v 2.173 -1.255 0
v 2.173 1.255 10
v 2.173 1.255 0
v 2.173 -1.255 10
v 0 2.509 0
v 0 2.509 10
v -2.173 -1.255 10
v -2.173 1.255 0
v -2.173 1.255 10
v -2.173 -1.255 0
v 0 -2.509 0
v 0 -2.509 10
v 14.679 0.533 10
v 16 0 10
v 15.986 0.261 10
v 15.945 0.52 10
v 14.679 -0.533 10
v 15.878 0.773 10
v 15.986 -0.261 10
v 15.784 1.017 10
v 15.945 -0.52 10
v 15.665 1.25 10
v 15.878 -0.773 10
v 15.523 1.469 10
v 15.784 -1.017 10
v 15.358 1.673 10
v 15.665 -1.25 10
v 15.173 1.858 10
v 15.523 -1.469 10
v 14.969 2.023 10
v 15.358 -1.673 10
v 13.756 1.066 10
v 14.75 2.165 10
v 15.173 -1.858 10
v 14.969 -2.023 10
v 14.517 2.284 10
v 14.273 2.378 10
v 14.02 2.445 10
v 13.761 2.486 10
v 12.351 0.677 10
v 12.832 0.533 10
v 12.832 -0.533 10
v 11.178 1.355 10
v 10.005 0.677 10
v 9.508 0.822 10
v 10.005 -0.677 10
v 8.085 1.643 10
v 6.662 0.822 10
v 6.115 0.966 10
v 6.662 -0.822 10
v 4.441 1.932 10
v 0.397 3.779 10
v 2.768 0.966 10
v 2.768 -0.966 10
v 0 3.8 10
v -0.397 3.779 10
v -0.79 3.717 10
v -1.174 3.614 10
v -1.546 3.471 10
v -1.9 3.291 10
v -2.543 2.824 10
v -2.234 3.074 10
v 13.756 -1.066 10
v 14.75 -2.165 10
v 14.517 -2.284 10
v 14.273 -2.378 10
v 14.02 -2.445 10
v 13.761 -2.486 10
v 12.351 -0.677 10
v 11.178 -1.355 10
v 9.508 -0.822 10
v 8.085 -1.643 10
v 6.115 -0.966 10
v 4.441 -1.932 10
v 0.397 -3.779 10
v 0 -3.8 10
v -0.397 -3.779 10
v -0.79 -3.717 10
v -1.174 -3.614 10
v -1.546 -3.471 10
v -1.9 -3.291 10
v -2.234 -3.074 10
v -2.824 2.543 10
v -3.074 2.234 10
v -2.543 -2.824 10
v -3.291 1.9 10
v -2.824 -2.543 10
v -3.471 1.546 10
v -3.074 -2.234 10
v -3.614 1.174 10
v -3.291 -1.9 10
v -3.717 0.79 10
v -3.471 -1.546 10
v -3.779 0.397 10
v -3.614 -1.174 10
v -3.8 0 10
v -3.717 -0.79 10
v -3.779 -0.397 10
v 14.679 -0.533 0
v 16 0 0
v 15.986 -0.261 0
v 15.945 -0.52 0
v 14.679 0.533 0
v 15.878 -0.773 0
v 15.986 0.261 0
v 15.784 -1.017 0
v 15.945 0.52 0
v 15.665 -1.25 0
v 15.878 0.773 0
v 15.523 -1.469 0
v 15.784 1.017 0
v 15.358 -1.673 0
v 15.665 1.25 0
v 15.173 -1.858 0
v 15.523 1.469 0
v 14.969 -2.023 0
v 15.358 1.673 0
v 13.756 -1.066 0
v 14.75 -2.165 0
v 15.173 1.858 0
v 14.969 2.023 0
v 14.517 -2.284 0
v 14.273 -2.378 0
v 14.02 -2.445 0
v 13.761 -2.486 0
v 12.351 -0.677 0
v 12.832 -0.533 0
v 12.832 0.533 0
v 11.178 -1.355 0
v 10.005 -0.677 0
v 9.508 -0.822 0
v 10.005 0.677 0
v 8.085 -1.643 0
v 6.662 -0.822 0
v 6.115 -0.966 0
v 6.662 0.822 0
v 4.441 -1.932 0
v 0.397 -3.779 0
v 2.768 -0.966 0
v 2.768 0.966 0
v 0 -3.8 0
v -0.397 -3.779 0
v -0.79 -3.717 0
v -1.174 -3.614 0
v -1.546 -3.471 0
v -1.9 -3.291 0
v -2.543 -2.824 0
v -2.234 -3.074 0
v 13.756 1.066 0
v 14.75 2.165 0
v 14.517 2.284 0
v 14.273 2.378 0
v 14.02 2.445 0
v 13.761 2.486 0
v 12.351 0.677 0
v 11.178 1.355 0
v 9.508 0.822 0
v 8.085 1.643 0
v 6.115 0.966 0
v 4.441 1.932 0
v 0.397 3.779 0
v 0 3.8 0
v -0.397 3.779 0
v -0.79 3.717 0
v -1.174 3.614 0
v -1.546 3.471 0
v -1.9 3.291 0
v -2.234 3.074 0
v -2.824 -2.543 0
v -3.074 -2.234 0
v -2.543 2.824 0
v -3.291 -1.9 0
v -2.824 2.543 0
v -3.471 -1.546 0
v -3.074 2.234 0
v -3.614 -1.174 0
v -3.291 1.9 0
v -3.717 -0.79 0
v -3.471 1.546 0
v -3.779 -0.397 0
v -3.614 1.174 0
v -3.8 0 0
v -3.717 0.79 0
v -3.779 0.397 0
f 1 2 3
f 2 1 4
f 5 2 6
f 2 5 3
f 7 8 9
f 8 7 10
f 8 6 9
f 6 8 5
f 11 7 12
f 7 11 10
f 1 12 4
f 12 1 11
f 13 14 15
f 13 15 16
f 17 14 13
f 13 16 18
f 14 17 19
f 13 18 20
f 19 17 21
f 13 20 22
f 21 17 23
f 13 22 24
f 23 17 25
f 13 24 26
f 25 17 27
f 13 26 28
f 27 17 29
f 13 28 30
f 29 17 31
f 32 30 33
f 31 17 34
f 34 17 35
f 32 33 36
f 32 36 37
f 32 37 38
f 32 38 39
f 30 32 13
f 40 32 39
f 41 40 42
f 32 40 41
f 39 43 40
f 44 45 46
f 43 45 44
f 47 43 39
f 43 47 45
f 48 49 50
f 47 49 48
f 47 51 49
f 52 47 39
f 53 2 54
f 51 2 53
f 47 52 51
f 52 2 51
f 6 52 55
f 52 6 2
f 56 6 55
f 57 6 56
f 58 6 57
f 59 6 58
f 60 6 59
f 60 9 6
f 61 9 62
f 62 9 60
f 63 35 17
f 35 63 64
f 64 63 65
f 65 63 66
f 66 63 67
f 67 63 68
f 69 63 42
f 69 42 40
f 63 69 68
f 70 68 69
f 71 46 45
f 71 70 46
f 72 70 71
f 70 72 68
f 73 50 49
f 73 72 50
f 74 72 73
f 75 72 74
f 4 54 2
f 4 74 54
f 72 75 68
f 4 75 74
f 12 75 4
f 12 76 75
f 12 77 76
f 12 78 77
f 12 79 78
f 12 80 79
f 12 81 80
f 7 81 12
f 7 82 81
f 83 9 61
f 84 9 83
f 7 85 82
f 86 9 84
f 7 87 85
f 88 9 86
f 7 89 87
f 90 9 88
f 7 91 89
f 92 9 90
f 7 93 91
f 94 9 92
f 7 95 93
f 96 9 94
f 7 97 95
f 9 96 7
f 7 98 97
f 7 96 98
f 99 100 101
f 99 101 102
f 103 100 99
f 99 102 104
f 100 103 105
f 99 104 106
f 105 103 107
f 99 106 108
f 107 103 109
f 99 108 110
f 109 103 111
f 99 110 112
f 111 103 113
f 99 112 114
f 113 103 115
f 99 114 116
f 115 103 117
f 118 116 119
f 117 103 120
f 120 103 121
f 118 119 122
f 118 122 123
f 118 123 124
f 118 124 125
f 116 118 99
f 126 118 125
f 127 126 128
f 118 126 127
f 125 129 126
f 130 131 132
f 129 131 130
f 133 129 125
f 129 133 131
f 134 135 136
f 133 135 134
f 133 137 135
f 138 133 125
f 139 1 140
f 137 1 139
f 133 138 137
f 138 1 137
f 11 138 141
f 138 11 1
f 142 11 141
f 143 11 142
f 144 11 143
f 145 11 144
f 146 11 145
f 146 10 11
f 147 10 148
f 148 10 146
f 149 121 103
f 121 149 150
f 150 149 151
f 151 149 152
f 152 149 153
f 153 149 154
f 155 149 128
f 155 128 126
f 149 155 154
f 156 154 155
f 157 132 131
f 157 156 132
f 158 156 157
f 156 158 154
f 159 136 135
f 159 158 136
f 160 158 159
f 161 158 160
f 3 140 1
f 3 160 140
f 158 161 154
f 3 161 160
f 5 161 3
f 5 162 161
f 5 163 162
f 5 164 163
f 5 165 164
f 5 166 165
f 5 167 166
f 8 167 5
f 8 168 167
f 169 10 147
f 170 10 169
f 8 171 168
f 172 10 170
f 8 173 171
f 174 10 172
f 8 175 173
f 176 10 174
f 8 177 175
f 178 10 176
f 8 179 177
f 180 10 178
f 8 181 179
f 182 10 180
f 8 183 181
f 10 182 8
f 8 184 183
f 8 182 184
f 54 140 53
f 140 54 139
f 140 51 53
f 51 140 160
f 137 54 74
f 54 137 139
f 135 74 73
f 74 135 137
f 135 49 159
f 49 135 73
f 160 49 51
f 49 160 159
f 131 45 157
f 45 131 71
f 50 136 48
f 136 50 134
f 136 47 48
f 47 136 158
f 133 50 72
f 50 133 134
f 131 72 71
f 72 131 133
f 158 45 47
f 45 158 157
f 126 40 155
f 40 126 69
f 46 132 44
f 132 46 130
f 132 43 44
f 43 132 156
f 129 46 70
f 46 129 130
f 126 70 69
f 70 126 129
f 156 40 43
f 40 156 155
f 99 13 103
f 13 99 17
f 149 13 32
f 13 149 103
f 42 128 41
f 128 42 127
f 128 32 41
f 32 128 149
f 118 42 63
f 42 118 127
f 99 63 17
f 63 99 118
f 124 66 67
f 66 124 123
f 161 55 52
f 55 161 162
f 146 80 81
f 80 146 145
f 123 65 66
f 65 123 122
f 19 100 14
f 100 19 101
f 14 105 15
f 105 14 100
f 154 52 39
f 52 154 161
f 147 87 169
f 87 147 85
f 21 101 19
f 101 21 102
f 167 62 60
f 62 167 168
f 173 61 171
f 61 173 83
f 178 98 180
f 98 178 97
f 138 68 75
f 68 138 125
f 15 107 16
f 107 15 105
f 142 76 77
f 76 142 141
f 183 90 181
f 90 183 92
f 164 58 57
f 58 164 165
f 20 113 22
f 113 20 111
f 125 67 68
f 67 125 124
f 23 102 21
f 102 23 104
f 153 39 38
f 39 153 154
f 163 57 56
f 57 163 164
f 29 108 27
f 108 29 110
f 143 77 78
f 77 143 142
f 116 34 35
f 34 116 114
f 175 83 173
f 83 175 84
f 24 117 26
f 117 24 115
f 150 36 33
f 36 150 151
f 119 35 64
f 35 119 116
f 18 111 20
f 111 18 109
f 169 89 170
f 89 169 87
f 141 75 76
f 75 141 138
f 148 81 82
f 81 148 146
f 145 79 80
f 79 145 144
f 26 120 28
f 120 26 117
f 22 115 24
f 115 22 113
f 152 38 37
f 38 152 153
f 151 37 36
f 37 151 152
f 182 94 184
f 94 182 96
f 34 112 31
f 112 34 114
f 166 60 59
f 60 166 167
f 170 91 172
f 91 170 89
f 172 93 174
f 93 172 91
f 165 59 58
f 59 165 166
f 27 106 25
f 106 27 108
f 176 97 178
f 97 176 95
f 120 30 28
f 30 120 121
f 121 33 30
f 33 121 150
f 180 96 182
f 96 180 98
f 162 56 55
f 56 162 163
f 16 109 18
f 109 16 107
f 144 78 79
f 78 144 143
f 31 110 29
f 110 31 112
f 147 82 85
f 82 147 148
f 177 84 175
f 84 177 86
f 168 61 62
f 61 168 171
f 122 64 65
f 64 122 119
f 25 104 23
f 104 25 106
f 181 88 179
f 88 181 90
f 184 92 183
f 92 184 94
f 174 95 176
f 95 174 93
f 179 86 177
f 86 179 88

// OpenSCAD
// Creality Ender 3 Pro comes with 5 Alan Keys 4, 3, 2.5, 2, 1.5 mm
// Radius is calculated by using the Pythagoras Theorem

ak40r=(0.5*4.0)/sin(60);   // Radius of Alan Key 4.0 mm
ak30r=(0.5*3.0)/sin(60);   // Radius of Alan Key 3.0 mm
ak25r=(0.5*2.5)/sin(60);   // Radius of Alan Key 2.5 mm
ak20r=(0.5*2.0)/sin(60);   // Radius of Alan Key 2.0 mm
ak15r=(0.5*1.5)/sin(60);   // Radius of Alan Key 1.5 mm

t=0.2;
h=10;

ak40x=0;
ak30x=ak40r+t+ak30r+t;
ak25x=ak40r+t+ak30r+t+ak25r+t+2.0;
ak20x=ak40r+t+ak30r+t+ak25r+t+ak25r+t+3.45;
ak15x=ak40r+t+ak30r+t+ak25r+t+ak20r+t+ak15r+t+5.25;



difference(){
    hull(){
        translate([0,0,0]) rotate(90) cylinder(r=3.8,h=h,$fn=60);
        translate([13.5,0,0]) rotate(90) cylinder(r=2.5,h=h,$fn=60);
    }
    union(){
        translate([ak40x,0,0]) rotate(90) cylinder(r=ak40r+t,h=h,$fn=6);
        translate([ak30x,0,0]) rotate(90) cylinder(r=ak30r+t,h=h,$fn=6);
        translate([ak25x,0,0]) rotate(90) cylinder(r=ak25r+t,h=h,$fn=6);
        translate([ak20x,0,0]) rotate(90) cylinder(r=ak20r+t,h=h,$fn=6);
        translate([ak15x,0,0]) rotate(90) cylinder(r=ak15r+t,h=h,$fn=6);
    }
}
